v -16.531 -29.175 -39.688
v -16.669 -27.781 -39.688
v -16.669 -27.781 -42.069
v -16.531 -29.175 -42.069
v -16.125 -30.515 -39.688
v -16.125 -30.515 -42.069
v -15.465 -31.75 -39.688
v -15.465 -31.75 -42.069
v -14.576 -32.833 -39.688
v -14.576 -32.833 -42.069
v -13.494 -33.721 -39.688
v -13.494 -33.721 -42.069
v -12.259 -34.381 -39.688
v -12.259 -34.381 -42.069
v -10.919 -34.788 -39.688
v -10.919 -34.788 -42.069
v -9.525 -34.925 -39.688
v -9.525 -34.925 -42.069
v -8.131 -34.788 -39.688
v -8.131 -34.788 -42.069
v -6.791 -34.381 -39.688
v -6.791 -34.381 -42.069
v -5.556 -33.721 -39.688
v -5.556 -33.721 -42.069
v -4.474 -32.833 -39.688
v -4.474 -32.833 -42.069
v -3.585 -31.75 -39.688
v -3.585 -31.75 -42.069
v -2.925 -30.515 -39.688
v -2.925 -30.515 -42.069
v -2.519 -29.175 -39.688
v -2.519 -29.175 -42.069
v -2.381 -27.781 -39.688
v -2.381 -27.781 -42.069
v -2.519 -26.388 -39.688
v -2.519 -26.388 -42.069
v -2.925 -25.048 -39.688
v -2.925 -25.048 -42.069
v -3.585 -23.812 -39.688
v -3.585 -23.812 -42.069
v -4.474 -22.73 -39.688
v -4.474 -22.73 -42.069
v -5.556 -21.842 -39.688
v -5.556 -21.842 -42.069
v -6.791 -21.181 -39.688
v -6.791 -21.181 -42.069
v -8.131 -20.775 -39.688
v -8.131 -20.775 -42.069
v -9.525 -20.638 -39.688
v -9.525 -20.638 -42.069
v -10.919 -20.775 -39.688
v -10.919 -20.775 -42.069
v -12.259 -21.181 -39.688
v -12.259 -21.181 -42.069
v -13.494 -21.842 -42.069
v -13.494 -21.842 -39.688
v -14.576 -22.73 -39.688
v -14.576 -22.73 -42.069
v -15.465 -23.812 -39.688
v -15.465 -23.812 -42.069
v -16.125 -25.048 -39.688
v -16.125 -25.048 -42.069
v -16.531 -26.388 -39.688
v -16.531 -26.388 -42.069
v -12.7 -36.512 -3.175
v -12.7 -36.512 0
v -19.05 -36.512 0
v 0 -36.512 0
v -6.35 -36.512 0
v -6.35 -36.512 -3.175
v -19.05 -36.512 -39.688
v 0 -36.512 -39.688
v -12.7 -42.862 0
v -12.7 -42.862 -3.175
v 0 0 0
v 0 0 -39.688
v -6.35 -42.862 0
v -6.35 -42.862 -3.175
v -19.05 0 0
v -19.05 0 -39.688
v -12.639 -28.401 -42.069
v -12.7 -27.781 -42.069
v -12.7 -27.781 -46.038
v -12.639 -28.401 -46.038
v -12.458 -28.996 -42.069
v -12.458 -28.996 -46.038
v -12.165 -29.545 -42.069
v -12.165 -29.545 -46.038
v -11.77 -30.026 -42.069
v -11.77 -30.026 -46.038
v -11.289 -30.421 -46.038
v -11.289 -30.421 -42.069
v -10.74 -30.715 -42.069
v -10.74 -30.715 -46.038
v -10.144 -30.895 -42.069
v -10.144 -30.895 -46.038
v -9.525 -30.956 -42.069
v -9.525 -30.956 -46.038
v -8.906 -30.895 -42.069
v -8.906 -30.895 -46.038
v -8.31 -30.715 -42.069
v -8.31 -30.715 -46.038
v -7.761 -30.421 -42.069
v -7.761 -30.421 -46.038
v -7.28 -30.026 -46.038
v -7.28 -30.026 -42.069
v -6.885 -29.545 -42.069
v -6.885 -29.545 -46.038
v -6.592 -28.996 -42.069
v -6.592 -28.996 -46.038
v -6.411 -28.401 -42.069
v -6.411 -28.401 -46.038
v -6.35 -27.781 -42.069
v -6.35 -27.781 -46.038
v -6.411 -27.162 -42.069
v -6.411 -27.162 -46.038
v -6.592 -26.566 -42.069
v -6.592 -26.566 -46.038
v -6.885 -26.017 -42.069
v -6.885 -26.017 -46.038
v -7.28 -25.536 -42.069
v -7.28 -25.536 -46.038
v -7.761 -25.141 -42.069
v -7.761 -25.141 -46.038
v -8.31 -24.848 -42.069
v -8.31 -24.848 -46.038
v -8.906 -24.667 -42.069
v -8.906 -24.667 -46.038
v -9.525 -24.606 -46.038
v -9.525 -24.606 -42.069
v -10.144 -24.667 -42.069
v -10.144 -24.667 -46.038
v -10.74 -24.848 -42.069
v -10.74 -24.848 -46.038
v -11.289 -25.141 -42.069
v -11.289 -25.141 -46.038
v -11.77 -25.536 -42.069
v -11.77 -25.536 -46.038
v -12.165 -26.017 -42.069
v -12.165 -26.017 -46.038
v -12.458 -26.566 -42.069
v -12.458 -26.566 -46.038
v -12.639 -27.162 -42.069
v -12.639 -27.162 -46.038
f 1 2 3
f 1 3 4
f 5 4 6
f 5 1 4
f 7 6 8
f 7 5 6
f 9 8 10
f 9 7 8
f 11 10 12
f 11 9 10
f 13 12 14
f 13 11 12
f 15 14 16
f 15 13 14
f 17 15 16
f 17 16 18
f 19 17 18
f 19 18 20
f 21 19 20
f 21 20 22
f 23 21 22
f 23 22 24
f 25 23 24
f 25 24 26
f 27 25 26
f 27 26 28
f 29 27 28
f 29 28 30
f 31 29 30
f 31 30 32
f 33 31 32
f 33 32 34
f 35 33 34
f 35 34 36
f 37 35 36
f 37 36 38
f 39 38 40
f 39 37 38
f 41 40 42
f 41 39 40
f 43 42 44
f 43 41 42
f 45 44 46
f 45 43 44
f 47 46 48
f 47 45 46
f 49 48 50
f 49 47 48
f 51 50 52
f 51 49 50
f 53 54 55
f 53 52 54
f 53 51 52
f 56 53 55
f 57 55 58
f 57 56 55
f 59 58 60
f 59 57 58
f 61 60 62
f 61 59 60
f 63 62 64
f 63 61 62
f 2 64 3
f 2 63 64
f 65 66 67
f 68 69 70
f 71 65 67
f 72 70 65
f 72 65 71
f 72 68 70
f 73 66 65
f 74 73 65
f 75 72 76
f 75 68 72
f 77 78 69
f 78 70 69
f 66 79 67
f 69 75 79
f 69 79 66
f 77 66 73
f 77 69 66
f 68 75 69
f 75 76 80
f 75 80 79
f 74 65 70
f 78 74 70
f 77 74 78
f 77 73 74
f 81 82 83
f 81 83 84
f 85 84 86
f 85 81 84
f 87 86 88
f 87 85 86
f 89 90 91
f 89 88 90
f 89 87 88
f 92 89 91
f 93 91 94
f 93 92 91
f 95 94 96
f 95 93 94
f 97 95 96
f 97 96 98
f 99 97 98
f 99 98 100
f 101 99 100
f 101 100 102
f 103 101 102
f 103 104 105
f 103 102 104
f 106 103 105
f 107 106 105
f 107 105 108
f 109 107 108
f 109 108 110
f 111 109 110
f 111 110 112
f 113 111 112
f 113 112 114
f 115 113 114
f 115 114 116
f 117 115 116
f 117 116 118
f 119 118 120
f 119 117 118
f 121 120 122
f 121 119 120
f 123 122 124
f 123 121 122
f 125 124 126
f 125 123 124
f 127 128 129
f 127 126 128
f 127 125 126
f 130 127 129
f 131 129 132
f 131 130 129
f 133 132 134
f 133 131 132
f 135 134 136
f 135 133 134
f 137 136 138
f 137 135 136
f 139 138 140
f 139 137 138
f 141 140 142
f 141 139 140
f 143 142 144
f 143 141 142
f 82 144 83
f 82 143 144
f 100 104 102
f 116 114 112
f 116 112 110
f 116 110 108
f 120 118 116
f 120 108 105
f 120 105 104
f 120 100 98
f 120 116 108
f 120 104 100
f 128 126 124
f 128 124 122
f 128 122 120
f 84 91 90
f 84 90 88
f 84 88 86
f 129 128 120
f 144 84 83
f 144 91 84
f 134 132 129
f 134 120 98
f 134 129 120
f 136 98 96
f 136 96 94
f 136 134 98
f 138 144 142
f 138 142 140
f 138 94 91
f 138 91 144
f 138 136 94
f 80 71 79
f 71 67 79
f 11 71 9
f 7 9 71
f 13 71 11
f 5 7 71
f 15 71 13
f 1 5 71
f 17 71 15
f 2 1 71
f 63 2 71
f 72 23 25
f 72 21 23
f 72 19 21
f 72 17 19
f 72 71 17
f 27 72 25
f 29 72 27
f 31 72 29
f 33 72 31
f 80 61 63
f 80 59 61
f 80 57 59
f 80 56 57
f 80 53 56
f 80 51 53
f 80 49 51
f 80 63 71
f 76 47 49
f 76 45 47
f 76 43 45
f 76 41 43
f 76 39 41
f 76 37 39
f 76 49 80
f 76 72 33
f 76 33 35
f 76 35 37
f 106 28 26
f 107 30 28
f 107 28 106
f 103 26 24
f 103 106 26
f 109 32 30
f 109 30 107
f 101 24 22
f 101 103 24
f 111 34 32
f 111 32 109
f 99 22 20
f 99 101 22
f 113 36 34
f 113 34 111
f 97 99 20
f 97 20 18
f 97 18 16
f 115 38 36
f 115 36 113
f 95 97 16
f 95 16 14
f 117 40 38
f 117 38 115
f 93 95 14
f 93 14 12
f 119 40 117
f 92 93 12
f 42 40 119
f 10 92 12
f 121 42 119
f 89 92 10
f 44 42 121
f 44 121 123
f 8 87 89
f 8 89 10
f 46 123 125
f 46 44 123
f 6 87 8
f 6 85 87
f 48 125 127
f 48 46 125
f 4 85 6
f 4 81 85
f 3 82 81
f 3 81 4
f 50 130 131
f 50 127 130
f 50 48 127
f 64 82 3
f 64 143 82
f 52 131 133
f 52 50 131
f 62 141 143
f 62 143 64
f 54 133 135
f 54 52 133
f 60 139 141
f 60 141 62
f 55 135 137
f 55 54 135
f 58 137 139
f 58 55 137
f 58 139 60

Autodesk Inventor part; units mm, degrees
ref_plane "YZ Plane" through (0, 0, 0) normal (1, 0, 0) x (0, 1, 0)
ref_plane "XZ Plane" through (0, 0, 0) normal (0, 1, 0) x (-1, 0, 0)
ref_plane "XY Plane" through (0, 0, 0) normal (0, 0, 1) x (1, 0, 0)
sketch "Sketch1" plane through (0, 0, 0) normal (1, 0, 0) x (0, 1, 0)
  line L0 (0, 0) -> (-36.5125, 0)
  line L1 (-36.5125, 0) -> (-36.5125, -39.6875)
  line L2 (-36.5125, -39.6875) -> (0, -39.6875)
  line L3 (0, -39.6875) -> (0, 0)
  dimension "d0" = 36.5125
  dimension "d1" = 39.6875
extrude "Extrusion1" add sketch "Sketch1" against normal blind 19.05
sketch "Sketch2" plane through (0, -36.5125, -39.6875) normal (0, 0, -1) x (-1, 0, 0)
  line L0 (0, 0) -> (0, 36.5125) construction
  line L1 (0, 0) -> (9.525, 0) construction
  line L2 (0, 0) -> (19.05, 0) construction
  line L3 (0, 0) -> (9.525, 0) construction
  line L4 (9.525, 0) -> (9.525, 1.5875) construction
  line L5 (9.525, 1.5875) -> (9.525, 8.7312) construction
  circle A0 centre (9.525, 8.7312) radius 7.1437
  dimension "d4" = 9.525
  dimension "d5" = 0
  dimension "d6" = 1.5875
  dimension "d7" = 7.1437
extrude "Extrusion2" add sketch "Sketch2" along normal blind 2.3813
sketch "Sketch3" plane through (-9.525, -27.7812, -42.0688) normal (0, 0, -1) x (-1, 0, 0)
  circle A0 centre (0, 0) radius 3.175
  point P0 (-9.525, 27.7812)
  dimension "d10" = 6.35
extrude "Extrusion3" add sketch "Sketch3" along normal blind 3.9688
sketch "Sketch4" plane through (0, -36.5125, -39.6875) normal (0, -1, 0) x (1, 0, 0)
  line L0 (0, 39.6875) -> (-6.35, 39.6875) construction
  line L1 (0, 39.6875) -> (-19.05, 39.6875) projected
  line L2 (-19.05, 39.6875) -> (-12.7, 39.6875) construction
  line L3 (-6.35, 39.6875) -> (-12.7, 39.6875) construction
  line L4 (-12.7, 39.6875) -> (-12.7, 36.5125)
  line L5 (-12.7, 36.5125) -> (-6.35, 36.5125)
  line L6 (-6.35, 36.5125) -> (-6.35, 39.6875)
  dimension "d13" = 6.35
  dimension "d14" = 6.35
  dimension "d15" = 3.175
extrude "Extrusion4" add sketch "Sketch4" along normal blind 6.35
properties part number "Reload_Motor"
